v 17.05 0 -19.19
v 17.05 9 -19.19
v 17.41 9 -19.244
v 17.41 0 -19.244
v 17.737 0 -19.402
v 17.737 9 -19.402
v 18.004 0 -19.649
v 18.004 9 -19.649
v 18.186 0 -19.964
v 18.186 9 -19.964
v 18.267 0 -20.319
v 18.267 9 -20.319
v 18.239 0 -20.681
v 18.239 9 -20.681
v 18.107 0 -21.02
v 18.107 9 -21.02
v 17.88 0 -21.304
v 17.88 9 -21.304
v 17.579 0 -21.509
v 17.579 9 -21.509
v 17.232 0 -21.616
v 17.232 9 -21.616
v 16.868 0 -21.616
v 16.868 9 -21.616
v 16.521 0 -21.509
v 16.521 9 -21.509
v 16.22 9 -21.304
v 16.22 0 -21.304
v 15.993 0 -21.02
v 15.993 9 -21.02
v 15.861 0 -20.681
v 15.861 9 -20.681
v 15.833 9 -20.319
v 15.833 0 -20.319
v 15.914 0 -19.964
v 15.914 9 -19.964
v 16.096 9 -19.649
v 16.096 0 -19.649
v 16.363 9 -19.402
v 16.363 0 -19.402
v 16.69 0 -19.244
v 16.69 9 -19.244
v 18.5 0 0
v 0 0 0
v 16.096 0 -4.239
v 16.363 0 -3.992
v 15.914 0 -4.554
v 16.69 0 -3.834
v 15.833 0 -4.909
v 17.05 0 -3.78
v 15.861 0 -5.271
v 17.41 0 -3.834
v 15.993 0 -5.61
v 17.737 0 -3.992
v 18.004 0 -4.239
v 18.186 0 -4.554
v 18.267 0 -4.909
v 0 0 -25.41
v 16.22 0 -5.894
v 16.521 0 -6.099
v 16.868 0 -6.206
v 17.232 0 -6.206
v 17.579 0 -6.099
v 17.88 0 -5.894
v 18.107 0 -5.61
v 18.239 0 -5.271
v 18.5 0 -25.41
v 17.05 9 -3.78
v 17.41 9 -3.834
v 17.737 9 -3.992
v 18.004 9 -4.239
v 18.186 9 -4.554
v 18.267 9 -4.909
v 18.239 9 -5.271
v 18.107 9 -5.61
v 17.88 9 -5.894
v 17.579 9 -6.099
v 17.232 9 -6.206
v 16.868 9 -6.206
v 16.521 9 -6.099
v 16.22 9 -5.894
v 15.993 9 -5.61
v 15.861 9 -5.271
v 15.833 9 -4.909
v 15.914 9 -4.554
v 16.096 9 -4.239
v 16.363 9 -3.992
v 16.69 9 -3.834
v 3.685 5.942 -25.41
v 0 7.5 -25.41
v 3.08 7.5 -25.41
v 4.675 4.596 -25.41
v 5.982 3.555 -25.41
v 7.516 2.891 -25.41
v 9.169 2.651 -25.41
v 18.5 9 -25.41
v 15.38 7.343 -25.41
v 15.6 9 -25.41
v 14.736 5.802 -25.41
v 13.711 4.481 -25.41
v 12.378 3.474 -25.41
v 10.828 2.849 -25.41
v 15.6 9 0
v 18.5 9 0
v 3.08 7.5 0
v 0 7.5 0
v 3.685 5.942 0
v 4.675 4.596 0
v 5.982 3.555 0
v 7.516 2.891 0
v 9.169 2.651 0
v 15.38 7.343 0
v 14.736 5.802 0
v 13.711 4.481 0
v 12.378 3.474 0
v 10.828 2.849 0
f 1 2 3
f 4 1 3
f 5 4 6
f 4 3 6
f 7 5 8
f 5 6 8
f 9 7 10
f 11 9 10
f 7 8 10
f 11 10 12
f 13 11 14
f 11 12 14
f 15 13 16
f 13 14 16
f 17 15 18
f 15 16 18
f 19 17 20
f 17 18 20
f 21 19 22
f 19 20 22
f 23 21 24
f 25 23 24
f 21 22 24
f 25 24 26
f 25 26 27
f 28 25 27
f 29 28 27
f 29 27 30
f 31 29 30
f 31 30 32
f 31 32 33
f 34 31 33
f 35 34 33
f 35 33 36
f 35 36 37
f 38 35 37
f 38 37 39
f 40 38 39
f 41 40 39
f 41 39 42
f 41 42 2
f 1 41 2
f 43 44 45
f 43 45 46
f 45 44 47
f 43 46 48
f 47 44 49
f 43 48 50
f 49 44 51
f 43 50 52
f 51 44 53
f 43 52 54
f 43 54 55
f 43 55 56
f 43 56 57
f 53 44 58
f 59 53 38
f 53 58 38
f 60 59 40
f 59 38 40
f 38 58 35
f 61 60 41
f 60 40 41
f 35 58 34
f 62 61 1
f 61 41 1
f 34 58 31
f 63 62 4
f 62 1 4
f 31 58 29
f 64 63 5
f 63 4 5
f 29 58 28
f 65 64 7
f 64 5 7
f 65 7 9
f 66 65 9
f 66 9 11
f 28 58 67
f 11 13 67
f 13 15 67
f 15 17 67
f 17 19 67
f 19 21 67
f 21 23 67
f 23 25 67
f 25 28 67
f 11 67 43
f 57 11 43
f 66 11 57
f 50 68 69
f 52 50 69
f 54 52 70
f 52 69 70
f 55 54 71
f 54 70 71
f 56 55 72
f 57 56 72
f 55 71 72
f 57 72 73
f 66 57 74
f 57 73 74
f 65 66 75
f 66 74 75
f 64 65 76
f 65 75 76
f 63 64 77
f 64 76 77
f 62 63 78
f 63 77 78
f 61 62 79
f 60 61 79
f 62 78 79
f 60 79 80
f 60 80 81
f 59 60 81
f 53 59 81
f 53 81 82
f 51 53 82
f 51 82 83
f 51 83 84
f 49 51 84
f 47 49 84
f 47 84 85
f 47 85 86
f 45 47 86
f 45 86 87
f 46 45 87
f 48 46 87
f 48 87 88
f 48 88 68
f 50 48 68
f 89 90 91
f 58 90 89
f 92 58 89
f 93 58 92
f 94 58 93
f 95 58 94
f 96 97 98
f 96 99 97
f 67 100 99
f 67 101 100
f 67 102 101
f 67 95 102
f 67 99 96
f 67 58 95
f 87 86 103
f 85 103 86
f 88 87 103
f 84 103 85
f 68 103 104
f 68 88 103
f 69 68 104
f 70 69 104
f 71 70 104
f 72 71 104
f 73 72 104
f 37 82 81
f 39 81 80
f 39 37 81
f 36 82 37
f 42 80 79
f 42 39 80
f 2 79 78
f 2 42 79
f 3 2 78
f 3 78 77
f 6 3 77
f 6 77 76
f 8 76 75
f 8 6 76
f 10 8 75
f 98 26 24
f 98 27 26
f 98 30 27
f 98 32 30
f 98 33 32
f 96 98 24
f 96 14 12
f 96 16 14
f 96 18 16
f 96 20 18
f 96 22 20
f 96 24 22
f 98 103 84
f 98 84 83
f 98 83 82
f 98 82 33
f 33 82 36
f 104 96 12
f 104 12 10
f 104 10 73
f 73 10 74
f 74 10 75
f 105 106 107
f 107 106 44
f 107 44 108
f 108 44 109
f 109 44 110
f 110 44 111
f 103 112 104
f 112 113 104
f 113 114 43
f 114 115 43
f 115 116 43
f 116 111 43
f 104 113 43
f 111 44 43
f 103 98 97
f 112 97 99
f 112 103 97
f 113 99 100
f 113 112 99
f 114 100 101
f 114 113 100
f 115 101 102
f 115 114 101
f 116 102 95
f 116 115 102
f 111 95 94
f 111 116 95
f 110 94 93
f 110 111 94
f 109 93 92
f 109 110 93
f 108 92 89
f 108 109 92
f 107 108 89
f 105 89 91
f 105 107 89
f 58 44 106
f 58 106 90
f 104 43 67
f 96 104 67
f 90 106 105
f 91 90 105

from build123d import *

# Parameters (mm, degrees)
SKETCH2_W               = 18.5
SKETCH2_H               = 25.41
BOSS_EXTRUDE1_DEPTH     = 9
CUT_EXTRUDE1_DEPTH      = 25.41
CUT_EXTRUDE3_DEPTH      = 33.694312961
CUT_EXTRUDE3_DEPTH_BACK = 25.41
SKETCH10_R              = 1.22
CUT_EXTRUDE4_DEPTH      = 33.694312961


with BuildPart() as part:
    # Sketch2 → Boss-Extrude1 (new body)
    with BuildSketch(Plane(origin=(0, 0, 0), x_dir=(1, 0, 0), z_dir=(0, 1, 0))):
        with Locations((9.25, 12.705)):
            Rectangle(SKETCH2_W, SKETCH2_H)
    extrude(amount=BOSS_EXTRUDE1_DEPTH)

    # Sketch6 → Cut-Extrude1 (cut)
    with BuildSketch(Plane.XY):
        with BuildLine():
            Line((2.9, 9), (15.6, 9))
            ThreePointArc((15.6, 9), (9.25, 2.65), (2.9, 9))
        make_face()
    extrude(amount=-CUT_EXTRUDE1_DEPTH, mode=Mode.SUBTRACT)

    # Sketch14 → Cut-Extrude3 (cut, two sides: drawn at the far end of the back side and taken through both)
    with BuildSketch(Plane(origin=(0, 0, -25.41), x_dir=(-1, 0, 0), z_dir=(0, 0, -1)).offset(-CUT_EXTRUDE3_DEPTH_BACK)):
        Polygon((0, 60.146081223), (0, 9), (0, 7.5), (-3.246658661, 7.5), (-2.9, 9), (8.616604878, 58.832614185), (24.031387378, 159.956651774), (15.4147825, 161.270118812), align=None)
    extrude(amount=CUT_EXTRUDE3_DEPTH + CUT_EXTRUDE3_DEPTH_BACK, mode=Mode.SUBTRACT)


with BuildPart() as cut_extrude3_kept_piece:
    # of the separate pieces the step leaves, the one the design keeps (cut_extrude3_pieces_kept)
    add(part.part.solids().sort_by_distance((0, 0, 0))[0])

    # Sketch10 → Cut-Extrude4 (cut, through all)
    with BuildSketch(Plane(origin=(0, 9, 0), x_dir=(1, 0, 0), z_dir=(0, 1, 0))):
        with Locations(Location((17.05, 20.41, 0), (0, 0, 270))):
            Circle(SKETCH10_R)
        with Locations(Location((17.05, 5, 0), (0, 0, 270))):
            Circle(SKETCH10_R)
    extrude(amount=-CUT_EXTRUDE4_DEPTH, mode=Mode.SUBTRACT)


solid = cut_extrude3_kept_piece.part
